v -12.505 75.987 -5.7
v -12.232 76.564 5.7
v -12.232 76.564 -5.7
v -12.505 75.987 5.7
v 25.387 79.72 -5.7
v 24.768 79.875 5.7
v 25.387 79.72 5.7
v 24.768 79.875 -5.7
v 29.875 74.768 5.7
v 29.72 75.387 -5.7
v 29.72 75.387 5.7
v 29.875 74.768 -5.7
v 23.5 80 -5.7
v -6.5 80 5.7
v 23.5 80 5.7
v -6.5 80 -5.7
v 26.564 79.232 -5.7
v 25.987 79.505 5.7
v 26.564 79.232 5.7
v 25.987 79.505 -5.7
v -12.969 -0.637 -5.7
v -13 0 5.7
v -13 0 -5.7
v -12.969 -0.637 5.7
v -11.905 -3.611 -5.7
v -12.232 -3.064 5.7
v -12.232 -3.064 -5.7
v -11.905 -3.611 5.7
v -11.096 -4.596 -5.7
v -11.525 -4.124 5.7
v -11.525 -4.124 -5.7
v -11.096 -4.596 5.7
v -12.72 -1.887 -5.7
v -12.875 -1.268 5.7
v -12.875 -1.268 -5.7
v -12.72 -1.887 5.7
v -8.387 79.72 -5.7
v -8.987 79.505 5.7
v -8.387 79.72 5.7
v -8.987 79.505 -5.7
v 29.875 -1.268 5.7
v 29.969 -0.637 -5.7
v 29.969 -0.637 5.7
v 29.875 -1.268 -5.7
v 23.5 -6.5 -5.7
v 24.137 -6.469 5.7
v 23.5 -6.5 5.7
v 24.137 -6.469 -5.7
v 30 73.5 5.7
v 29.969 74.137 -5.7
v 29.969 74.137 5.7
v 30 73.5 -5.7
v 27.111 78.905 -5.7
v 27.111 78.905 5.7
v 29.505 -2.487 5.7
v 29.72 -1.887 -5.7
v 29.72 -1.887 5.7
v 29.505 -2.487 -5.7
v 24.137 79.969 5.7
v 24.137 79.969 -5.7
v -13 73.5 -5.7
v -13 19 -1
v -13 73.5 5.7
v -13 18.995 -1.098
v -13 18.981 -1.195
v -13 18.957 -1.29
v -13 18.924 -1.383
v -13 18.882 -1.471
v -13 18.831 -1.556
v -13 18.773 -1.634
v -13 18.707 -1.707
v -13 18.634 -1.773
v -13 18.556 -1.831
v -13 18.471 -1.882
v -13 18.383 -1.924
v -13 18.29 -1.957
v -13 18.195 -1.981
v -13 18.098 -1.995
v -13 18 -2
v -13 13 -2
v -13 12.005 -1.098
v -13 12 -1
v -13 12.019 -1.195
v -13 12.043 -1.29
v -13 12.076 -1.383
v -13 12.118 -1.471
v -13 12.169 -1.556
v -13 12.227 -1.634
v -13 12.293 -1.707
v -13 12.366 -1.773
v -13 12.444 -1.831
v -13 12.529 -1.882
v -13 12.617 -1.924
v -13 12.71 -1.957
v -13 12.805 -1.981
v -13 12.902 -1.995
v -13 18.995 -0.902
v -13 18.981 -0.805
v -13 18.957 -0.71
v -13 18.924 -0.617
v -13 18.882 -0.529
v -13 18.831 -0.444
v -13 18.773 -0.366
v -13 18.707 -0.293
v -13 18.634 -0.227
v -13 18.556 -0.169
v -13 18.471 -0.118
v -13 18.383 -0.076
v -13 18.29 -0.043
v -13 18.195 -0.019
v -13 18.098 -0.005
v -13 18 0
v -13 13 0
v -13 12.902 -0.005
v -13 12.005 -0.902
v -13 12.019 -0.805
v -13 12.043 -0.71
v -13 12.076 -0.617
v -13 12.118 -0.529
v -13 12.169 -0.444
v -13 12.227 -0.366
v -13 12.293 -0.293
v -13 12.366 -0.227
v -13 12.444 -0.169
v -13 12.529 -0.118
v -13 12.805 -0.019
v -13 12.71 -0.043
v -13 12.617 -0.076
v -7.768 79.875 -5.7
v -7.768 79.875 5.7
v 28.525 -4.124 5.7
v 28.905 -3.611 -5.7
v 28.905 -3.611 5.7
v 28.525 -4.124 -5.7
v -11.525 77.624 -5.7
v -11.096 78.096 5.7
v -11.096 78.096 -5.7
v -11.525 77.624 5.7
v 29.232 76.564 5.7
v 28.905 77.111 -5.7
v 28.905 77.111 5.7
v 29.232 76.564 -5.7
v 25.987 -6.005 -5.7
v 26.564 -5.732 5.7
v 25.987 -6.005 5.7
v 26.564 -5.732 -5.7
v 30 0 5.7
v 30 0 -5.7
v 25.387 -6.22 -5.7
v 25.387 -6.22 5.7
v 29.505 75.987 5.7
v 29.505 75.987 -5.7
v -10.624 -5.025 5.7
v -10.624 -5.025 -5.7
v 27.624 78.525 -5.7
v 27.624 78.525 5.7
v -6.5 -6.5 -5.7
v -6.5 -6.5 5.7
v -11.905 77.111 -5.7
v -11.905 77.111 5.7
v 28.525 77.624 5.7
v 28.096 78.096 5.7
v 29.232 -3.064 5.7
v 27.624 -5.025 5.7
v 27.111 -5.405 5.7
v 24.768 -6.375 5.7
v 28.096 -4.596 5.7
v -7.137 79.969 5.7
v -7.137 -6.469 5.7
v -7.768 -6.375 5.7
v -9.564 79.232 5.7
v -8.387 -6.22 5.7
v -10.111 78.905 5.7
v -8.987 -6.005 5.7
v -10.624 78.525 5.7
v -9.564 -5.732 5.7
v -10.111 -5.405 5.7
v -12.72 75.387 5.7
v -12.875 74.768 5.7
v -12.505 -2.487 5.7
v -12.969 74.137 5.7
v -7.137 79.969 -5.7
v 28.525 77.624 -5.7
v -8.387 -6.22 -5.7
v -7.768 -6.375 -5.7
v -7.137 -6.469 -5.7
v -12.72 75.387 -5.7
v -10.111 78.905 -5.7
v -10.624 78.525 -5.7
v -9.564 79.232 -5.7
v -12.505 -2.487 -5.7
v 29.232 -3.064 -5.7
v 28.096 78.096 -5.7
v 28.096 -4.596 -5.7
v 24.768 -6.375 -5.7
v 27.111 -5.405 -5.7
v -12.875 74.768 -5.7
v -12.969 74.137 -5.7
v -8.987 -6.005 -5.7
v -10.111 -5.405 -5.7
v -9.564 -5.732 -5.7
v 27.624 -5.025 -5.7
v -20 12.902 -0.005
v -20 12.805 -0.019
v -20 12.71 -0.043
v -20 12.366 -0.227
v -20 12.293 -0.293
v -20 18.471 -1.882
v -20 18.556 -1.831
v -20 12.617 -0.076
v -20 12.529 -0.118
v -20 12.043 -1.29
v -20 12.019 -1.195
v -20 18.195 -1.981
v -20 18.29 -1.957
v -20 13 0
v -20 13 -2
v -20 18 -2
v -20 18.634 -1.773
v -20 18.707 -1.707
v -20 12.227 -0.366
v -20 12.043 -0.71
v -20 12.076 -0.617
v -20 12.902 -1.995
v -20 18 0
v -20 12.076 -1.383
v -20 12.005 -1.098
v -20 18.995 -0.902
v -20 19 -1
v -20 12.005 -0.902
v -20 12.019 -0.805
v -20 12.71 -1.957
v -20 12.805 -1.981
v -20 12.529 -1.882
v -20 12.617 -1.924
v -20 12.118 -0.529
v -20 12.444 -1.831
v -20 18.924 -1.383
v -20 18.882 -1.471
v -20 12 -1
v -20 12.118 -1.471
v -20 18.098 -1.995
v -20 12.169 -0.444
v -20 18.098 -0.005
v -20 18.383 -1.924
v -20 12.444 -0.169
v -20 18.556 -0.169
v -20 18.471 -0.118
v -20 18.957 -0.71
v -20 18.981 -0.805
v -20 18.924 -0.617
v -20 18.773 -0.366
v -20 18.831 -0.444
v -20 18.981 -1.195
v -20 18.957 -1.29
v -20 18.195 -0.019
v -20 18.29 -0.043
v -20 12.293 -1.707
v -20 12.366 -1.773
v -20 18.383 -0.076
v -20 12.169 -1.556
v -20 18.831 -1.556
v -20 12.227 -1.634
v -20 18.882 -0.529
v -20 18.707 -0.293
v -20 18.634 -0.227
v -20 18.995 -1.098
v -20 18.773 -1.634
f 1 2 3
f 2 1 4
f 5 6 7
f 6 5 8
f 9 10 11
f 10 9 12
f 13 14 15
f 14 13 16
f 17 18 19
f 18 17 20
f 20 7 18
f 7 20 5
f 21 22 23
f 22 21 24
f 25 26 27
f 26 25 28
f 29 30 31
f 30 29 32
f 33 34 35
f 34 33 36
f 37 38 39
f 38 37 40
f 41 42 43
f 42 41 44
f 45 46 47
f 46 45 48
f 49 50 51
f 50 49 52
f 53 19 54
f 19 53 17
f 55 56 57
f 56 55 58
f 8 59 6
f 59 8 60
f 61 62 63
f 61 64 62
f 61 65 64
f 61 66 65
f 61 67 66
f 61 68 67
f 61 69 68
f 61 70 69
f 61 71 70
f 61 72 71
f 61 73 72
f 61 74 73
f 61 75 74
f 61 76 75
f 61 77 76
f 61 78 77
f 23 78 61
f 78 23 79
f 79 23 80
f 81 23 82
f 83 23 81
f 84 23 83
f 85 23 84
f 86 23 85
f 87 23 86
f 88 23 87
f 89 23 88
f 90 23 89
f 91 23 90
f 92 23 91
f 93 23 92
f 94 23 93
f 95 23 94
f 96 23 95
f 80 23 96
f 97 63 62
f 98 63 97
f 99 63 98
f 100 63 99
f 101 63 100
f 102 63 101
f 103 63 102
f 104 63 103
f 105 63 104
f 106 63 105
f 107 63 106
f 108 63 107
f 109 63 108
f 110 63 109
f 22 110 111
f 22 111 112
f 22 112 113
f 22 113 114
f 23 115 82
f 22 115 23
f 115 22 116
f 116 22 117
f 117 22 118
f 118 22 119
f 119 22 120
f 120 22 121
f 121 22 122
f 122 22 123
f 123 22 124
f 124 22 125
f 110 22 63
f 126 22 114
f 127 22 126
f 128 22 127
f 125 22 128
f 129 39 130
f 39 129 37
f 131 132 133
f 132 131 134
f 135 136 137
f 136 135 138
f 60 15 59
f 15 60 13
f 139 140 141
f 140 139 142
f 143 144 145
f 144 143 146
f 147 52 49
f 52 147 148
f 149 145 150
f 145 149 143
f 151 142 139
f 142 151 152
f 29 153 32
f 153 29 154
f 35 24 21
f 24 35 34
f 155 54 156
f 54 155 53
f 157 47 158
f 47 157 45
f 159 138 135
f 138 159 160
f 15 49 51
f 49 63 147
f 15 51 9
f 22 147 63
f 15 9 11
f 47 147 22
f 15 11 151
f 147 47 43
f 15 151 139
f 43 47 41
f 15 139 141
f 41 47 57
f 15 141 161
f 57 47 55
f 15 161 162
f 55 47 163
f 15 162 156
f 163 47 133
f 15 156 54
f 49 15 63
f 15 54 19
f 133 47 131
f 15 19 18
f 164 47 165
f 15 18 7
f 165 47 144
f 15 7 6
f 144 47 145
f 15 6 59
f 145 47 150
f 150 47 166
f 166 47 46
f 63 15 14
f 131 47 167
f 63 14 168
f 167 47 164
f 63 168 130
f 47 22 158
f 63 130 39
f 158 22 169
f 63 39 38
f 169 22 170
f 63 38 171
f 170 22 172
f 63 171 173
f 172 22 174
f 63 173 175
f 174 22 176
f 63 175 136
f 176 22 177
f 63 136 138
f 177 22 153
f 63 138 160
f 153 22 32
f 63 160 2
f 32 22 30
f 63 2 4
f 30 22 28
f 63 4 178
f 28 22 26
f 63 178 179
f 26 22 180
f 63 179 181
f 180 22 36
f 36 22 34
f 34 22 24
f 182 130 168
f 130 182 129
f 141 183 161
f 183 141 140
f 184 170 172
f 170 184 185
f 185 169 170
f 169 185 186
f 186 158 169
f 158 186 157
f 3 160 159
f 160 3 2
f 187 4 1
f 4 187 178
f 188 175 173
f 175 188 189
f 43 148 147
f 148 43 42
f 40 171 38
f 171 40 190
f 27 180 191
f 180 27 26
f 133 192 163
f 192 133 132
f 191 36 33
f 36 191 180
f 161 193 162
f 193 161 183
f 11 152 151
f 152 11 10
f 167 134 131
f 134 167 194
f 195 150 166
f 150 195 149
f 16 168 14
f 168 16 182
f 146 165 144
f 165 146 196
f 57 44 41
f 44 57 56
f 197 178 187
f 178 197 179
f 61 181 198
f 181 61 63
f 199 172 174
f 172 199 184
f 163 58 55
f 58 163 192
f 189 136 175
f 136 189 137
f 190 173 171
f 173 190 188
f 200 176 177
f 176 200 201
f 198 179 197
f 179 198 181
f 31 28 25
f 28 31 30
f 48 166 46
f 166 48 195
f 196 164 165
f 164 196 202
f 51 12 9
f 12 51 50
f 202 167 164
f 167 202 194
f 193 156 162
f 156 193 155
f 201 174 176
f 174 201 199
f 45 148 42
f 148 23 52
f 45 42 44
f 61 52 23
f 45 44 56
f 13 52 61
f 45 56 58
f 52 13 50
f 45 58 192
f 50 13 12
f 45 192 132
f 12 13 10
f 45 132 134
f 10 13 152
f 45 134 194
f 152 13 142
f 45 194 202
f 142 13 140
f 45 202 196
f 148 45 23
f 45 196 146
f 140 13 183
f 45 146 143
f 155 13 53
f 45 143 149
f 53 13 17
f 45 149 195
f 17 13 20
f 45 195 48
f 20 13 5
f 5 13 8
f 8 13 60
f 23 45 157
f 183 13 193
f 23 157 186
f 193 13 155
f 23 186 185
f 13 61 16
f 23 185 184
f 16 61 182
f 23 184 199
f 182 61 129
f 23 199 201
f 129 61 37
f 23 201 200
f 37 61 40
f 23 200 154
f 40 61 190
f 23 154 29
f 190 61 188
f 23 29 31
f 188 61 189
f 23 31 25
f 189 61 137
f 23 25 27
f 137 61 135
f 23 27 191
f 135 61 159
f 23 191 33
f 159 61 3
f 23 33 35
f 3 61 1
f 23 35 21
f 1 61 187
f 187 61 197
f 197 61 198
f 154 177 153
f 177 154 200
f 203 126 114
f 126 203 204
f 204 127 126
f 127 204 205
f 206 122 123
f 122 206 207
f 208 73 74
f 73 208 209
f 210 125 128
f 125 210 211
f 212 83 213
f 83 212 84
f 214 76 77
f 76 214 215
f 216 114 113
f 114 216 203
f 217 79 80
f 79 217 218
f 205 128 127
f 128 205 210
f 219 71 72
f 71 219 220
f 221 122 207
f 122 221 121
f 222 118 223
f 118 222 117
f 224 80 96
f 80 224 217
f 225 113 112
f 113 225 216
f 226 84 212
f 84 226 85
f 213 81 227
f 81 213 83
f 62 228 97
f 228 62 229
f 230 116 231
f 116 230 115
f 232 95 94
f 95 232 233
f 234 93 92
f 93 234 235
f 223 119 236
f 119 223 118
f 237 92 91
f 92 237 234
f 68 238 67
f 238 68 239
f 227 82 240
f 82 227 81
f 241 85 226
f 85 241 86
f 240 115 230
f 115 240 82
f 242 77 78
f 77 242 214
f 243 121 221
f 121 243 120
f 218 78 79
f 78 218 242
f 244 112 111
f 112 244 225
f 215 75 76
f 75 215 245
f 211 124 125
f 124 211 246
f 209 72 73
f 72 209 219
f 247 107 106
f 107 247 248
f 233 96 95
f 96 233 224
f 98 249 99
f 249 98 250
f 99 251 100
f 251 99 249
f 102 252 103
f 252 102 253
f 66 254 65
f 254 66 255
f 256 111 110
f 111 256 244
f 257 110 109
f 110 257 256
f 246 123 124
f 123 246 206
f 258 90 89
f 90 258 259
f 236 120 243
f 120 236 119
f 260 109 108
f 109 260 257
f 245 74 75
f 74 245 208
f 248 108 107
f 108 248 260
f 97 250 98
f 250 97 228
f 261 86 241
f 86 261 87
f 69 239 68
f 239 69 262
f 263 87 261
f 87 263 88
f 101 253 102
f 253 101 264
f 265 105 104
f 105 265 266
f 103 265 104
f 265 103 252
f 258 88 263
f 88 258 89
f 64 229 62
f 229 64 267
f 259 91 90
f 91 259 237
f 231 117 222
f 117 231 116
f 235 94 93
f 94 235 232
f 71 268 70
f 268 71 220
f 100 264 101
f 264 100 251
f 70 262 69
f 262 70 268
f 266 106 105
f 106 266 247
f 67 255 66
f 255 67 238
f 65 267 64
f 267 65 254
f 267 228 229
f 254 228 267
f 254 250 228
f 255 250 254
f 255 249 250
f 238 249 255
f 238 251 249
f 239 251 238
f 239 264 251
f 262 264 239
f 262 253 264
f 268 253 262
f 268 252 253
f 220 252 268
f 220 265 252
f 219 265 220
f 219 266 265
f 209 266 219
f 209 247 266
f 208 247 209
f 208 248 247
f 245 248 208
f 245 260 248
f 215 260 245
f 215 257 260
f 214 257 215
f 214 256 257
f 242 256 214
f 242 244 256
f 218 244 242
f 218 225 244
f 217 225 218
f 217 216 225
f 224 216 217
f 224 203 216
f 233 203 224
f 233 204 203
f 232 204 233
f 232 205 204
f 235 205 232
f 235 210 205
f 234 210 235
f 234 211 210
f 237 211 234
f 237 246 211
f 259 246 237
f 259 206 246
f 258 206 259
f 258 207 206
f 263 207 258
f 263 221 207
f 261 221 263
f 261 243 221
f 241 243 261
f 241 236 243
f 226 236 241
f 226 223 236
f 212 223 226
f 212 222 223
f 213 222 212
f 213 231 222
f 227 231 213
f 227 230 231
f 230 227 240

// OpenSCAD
$fn = 64;
CornerRadius = 6.5;
translate([ 0, 0, 0 ]) hull()
{
    translate([ 0 - CornerRadius, 0, 0 ]) cylinder(r = 6.5, h = 11.4, center = true);
    translate([ 30 - CornerRadius, 0, 0 ]) cylinder(r = 6.5, h = 11.4, center = true);
    translate([ 0 - CornerRadius, 80 - CornerRadius, 0 ]) cylinder(r = 6.5, h = 11.4, center = true);
    translate([ 30 - CornerRadius, 80 - CornerRadius, 0 ]) cylinder(r = 6.5, h = 11.4, center = true);
};

translate([ -15, 13, -1 ]) rotate([ 0, 90, 0 ])
{
    hull()
    {
        cylinder(r = 1, h = 10, center = true);
        translate([ 0, 5, 0 ]) cylinder(r = 1, h = 10, center = true);
    }
}
